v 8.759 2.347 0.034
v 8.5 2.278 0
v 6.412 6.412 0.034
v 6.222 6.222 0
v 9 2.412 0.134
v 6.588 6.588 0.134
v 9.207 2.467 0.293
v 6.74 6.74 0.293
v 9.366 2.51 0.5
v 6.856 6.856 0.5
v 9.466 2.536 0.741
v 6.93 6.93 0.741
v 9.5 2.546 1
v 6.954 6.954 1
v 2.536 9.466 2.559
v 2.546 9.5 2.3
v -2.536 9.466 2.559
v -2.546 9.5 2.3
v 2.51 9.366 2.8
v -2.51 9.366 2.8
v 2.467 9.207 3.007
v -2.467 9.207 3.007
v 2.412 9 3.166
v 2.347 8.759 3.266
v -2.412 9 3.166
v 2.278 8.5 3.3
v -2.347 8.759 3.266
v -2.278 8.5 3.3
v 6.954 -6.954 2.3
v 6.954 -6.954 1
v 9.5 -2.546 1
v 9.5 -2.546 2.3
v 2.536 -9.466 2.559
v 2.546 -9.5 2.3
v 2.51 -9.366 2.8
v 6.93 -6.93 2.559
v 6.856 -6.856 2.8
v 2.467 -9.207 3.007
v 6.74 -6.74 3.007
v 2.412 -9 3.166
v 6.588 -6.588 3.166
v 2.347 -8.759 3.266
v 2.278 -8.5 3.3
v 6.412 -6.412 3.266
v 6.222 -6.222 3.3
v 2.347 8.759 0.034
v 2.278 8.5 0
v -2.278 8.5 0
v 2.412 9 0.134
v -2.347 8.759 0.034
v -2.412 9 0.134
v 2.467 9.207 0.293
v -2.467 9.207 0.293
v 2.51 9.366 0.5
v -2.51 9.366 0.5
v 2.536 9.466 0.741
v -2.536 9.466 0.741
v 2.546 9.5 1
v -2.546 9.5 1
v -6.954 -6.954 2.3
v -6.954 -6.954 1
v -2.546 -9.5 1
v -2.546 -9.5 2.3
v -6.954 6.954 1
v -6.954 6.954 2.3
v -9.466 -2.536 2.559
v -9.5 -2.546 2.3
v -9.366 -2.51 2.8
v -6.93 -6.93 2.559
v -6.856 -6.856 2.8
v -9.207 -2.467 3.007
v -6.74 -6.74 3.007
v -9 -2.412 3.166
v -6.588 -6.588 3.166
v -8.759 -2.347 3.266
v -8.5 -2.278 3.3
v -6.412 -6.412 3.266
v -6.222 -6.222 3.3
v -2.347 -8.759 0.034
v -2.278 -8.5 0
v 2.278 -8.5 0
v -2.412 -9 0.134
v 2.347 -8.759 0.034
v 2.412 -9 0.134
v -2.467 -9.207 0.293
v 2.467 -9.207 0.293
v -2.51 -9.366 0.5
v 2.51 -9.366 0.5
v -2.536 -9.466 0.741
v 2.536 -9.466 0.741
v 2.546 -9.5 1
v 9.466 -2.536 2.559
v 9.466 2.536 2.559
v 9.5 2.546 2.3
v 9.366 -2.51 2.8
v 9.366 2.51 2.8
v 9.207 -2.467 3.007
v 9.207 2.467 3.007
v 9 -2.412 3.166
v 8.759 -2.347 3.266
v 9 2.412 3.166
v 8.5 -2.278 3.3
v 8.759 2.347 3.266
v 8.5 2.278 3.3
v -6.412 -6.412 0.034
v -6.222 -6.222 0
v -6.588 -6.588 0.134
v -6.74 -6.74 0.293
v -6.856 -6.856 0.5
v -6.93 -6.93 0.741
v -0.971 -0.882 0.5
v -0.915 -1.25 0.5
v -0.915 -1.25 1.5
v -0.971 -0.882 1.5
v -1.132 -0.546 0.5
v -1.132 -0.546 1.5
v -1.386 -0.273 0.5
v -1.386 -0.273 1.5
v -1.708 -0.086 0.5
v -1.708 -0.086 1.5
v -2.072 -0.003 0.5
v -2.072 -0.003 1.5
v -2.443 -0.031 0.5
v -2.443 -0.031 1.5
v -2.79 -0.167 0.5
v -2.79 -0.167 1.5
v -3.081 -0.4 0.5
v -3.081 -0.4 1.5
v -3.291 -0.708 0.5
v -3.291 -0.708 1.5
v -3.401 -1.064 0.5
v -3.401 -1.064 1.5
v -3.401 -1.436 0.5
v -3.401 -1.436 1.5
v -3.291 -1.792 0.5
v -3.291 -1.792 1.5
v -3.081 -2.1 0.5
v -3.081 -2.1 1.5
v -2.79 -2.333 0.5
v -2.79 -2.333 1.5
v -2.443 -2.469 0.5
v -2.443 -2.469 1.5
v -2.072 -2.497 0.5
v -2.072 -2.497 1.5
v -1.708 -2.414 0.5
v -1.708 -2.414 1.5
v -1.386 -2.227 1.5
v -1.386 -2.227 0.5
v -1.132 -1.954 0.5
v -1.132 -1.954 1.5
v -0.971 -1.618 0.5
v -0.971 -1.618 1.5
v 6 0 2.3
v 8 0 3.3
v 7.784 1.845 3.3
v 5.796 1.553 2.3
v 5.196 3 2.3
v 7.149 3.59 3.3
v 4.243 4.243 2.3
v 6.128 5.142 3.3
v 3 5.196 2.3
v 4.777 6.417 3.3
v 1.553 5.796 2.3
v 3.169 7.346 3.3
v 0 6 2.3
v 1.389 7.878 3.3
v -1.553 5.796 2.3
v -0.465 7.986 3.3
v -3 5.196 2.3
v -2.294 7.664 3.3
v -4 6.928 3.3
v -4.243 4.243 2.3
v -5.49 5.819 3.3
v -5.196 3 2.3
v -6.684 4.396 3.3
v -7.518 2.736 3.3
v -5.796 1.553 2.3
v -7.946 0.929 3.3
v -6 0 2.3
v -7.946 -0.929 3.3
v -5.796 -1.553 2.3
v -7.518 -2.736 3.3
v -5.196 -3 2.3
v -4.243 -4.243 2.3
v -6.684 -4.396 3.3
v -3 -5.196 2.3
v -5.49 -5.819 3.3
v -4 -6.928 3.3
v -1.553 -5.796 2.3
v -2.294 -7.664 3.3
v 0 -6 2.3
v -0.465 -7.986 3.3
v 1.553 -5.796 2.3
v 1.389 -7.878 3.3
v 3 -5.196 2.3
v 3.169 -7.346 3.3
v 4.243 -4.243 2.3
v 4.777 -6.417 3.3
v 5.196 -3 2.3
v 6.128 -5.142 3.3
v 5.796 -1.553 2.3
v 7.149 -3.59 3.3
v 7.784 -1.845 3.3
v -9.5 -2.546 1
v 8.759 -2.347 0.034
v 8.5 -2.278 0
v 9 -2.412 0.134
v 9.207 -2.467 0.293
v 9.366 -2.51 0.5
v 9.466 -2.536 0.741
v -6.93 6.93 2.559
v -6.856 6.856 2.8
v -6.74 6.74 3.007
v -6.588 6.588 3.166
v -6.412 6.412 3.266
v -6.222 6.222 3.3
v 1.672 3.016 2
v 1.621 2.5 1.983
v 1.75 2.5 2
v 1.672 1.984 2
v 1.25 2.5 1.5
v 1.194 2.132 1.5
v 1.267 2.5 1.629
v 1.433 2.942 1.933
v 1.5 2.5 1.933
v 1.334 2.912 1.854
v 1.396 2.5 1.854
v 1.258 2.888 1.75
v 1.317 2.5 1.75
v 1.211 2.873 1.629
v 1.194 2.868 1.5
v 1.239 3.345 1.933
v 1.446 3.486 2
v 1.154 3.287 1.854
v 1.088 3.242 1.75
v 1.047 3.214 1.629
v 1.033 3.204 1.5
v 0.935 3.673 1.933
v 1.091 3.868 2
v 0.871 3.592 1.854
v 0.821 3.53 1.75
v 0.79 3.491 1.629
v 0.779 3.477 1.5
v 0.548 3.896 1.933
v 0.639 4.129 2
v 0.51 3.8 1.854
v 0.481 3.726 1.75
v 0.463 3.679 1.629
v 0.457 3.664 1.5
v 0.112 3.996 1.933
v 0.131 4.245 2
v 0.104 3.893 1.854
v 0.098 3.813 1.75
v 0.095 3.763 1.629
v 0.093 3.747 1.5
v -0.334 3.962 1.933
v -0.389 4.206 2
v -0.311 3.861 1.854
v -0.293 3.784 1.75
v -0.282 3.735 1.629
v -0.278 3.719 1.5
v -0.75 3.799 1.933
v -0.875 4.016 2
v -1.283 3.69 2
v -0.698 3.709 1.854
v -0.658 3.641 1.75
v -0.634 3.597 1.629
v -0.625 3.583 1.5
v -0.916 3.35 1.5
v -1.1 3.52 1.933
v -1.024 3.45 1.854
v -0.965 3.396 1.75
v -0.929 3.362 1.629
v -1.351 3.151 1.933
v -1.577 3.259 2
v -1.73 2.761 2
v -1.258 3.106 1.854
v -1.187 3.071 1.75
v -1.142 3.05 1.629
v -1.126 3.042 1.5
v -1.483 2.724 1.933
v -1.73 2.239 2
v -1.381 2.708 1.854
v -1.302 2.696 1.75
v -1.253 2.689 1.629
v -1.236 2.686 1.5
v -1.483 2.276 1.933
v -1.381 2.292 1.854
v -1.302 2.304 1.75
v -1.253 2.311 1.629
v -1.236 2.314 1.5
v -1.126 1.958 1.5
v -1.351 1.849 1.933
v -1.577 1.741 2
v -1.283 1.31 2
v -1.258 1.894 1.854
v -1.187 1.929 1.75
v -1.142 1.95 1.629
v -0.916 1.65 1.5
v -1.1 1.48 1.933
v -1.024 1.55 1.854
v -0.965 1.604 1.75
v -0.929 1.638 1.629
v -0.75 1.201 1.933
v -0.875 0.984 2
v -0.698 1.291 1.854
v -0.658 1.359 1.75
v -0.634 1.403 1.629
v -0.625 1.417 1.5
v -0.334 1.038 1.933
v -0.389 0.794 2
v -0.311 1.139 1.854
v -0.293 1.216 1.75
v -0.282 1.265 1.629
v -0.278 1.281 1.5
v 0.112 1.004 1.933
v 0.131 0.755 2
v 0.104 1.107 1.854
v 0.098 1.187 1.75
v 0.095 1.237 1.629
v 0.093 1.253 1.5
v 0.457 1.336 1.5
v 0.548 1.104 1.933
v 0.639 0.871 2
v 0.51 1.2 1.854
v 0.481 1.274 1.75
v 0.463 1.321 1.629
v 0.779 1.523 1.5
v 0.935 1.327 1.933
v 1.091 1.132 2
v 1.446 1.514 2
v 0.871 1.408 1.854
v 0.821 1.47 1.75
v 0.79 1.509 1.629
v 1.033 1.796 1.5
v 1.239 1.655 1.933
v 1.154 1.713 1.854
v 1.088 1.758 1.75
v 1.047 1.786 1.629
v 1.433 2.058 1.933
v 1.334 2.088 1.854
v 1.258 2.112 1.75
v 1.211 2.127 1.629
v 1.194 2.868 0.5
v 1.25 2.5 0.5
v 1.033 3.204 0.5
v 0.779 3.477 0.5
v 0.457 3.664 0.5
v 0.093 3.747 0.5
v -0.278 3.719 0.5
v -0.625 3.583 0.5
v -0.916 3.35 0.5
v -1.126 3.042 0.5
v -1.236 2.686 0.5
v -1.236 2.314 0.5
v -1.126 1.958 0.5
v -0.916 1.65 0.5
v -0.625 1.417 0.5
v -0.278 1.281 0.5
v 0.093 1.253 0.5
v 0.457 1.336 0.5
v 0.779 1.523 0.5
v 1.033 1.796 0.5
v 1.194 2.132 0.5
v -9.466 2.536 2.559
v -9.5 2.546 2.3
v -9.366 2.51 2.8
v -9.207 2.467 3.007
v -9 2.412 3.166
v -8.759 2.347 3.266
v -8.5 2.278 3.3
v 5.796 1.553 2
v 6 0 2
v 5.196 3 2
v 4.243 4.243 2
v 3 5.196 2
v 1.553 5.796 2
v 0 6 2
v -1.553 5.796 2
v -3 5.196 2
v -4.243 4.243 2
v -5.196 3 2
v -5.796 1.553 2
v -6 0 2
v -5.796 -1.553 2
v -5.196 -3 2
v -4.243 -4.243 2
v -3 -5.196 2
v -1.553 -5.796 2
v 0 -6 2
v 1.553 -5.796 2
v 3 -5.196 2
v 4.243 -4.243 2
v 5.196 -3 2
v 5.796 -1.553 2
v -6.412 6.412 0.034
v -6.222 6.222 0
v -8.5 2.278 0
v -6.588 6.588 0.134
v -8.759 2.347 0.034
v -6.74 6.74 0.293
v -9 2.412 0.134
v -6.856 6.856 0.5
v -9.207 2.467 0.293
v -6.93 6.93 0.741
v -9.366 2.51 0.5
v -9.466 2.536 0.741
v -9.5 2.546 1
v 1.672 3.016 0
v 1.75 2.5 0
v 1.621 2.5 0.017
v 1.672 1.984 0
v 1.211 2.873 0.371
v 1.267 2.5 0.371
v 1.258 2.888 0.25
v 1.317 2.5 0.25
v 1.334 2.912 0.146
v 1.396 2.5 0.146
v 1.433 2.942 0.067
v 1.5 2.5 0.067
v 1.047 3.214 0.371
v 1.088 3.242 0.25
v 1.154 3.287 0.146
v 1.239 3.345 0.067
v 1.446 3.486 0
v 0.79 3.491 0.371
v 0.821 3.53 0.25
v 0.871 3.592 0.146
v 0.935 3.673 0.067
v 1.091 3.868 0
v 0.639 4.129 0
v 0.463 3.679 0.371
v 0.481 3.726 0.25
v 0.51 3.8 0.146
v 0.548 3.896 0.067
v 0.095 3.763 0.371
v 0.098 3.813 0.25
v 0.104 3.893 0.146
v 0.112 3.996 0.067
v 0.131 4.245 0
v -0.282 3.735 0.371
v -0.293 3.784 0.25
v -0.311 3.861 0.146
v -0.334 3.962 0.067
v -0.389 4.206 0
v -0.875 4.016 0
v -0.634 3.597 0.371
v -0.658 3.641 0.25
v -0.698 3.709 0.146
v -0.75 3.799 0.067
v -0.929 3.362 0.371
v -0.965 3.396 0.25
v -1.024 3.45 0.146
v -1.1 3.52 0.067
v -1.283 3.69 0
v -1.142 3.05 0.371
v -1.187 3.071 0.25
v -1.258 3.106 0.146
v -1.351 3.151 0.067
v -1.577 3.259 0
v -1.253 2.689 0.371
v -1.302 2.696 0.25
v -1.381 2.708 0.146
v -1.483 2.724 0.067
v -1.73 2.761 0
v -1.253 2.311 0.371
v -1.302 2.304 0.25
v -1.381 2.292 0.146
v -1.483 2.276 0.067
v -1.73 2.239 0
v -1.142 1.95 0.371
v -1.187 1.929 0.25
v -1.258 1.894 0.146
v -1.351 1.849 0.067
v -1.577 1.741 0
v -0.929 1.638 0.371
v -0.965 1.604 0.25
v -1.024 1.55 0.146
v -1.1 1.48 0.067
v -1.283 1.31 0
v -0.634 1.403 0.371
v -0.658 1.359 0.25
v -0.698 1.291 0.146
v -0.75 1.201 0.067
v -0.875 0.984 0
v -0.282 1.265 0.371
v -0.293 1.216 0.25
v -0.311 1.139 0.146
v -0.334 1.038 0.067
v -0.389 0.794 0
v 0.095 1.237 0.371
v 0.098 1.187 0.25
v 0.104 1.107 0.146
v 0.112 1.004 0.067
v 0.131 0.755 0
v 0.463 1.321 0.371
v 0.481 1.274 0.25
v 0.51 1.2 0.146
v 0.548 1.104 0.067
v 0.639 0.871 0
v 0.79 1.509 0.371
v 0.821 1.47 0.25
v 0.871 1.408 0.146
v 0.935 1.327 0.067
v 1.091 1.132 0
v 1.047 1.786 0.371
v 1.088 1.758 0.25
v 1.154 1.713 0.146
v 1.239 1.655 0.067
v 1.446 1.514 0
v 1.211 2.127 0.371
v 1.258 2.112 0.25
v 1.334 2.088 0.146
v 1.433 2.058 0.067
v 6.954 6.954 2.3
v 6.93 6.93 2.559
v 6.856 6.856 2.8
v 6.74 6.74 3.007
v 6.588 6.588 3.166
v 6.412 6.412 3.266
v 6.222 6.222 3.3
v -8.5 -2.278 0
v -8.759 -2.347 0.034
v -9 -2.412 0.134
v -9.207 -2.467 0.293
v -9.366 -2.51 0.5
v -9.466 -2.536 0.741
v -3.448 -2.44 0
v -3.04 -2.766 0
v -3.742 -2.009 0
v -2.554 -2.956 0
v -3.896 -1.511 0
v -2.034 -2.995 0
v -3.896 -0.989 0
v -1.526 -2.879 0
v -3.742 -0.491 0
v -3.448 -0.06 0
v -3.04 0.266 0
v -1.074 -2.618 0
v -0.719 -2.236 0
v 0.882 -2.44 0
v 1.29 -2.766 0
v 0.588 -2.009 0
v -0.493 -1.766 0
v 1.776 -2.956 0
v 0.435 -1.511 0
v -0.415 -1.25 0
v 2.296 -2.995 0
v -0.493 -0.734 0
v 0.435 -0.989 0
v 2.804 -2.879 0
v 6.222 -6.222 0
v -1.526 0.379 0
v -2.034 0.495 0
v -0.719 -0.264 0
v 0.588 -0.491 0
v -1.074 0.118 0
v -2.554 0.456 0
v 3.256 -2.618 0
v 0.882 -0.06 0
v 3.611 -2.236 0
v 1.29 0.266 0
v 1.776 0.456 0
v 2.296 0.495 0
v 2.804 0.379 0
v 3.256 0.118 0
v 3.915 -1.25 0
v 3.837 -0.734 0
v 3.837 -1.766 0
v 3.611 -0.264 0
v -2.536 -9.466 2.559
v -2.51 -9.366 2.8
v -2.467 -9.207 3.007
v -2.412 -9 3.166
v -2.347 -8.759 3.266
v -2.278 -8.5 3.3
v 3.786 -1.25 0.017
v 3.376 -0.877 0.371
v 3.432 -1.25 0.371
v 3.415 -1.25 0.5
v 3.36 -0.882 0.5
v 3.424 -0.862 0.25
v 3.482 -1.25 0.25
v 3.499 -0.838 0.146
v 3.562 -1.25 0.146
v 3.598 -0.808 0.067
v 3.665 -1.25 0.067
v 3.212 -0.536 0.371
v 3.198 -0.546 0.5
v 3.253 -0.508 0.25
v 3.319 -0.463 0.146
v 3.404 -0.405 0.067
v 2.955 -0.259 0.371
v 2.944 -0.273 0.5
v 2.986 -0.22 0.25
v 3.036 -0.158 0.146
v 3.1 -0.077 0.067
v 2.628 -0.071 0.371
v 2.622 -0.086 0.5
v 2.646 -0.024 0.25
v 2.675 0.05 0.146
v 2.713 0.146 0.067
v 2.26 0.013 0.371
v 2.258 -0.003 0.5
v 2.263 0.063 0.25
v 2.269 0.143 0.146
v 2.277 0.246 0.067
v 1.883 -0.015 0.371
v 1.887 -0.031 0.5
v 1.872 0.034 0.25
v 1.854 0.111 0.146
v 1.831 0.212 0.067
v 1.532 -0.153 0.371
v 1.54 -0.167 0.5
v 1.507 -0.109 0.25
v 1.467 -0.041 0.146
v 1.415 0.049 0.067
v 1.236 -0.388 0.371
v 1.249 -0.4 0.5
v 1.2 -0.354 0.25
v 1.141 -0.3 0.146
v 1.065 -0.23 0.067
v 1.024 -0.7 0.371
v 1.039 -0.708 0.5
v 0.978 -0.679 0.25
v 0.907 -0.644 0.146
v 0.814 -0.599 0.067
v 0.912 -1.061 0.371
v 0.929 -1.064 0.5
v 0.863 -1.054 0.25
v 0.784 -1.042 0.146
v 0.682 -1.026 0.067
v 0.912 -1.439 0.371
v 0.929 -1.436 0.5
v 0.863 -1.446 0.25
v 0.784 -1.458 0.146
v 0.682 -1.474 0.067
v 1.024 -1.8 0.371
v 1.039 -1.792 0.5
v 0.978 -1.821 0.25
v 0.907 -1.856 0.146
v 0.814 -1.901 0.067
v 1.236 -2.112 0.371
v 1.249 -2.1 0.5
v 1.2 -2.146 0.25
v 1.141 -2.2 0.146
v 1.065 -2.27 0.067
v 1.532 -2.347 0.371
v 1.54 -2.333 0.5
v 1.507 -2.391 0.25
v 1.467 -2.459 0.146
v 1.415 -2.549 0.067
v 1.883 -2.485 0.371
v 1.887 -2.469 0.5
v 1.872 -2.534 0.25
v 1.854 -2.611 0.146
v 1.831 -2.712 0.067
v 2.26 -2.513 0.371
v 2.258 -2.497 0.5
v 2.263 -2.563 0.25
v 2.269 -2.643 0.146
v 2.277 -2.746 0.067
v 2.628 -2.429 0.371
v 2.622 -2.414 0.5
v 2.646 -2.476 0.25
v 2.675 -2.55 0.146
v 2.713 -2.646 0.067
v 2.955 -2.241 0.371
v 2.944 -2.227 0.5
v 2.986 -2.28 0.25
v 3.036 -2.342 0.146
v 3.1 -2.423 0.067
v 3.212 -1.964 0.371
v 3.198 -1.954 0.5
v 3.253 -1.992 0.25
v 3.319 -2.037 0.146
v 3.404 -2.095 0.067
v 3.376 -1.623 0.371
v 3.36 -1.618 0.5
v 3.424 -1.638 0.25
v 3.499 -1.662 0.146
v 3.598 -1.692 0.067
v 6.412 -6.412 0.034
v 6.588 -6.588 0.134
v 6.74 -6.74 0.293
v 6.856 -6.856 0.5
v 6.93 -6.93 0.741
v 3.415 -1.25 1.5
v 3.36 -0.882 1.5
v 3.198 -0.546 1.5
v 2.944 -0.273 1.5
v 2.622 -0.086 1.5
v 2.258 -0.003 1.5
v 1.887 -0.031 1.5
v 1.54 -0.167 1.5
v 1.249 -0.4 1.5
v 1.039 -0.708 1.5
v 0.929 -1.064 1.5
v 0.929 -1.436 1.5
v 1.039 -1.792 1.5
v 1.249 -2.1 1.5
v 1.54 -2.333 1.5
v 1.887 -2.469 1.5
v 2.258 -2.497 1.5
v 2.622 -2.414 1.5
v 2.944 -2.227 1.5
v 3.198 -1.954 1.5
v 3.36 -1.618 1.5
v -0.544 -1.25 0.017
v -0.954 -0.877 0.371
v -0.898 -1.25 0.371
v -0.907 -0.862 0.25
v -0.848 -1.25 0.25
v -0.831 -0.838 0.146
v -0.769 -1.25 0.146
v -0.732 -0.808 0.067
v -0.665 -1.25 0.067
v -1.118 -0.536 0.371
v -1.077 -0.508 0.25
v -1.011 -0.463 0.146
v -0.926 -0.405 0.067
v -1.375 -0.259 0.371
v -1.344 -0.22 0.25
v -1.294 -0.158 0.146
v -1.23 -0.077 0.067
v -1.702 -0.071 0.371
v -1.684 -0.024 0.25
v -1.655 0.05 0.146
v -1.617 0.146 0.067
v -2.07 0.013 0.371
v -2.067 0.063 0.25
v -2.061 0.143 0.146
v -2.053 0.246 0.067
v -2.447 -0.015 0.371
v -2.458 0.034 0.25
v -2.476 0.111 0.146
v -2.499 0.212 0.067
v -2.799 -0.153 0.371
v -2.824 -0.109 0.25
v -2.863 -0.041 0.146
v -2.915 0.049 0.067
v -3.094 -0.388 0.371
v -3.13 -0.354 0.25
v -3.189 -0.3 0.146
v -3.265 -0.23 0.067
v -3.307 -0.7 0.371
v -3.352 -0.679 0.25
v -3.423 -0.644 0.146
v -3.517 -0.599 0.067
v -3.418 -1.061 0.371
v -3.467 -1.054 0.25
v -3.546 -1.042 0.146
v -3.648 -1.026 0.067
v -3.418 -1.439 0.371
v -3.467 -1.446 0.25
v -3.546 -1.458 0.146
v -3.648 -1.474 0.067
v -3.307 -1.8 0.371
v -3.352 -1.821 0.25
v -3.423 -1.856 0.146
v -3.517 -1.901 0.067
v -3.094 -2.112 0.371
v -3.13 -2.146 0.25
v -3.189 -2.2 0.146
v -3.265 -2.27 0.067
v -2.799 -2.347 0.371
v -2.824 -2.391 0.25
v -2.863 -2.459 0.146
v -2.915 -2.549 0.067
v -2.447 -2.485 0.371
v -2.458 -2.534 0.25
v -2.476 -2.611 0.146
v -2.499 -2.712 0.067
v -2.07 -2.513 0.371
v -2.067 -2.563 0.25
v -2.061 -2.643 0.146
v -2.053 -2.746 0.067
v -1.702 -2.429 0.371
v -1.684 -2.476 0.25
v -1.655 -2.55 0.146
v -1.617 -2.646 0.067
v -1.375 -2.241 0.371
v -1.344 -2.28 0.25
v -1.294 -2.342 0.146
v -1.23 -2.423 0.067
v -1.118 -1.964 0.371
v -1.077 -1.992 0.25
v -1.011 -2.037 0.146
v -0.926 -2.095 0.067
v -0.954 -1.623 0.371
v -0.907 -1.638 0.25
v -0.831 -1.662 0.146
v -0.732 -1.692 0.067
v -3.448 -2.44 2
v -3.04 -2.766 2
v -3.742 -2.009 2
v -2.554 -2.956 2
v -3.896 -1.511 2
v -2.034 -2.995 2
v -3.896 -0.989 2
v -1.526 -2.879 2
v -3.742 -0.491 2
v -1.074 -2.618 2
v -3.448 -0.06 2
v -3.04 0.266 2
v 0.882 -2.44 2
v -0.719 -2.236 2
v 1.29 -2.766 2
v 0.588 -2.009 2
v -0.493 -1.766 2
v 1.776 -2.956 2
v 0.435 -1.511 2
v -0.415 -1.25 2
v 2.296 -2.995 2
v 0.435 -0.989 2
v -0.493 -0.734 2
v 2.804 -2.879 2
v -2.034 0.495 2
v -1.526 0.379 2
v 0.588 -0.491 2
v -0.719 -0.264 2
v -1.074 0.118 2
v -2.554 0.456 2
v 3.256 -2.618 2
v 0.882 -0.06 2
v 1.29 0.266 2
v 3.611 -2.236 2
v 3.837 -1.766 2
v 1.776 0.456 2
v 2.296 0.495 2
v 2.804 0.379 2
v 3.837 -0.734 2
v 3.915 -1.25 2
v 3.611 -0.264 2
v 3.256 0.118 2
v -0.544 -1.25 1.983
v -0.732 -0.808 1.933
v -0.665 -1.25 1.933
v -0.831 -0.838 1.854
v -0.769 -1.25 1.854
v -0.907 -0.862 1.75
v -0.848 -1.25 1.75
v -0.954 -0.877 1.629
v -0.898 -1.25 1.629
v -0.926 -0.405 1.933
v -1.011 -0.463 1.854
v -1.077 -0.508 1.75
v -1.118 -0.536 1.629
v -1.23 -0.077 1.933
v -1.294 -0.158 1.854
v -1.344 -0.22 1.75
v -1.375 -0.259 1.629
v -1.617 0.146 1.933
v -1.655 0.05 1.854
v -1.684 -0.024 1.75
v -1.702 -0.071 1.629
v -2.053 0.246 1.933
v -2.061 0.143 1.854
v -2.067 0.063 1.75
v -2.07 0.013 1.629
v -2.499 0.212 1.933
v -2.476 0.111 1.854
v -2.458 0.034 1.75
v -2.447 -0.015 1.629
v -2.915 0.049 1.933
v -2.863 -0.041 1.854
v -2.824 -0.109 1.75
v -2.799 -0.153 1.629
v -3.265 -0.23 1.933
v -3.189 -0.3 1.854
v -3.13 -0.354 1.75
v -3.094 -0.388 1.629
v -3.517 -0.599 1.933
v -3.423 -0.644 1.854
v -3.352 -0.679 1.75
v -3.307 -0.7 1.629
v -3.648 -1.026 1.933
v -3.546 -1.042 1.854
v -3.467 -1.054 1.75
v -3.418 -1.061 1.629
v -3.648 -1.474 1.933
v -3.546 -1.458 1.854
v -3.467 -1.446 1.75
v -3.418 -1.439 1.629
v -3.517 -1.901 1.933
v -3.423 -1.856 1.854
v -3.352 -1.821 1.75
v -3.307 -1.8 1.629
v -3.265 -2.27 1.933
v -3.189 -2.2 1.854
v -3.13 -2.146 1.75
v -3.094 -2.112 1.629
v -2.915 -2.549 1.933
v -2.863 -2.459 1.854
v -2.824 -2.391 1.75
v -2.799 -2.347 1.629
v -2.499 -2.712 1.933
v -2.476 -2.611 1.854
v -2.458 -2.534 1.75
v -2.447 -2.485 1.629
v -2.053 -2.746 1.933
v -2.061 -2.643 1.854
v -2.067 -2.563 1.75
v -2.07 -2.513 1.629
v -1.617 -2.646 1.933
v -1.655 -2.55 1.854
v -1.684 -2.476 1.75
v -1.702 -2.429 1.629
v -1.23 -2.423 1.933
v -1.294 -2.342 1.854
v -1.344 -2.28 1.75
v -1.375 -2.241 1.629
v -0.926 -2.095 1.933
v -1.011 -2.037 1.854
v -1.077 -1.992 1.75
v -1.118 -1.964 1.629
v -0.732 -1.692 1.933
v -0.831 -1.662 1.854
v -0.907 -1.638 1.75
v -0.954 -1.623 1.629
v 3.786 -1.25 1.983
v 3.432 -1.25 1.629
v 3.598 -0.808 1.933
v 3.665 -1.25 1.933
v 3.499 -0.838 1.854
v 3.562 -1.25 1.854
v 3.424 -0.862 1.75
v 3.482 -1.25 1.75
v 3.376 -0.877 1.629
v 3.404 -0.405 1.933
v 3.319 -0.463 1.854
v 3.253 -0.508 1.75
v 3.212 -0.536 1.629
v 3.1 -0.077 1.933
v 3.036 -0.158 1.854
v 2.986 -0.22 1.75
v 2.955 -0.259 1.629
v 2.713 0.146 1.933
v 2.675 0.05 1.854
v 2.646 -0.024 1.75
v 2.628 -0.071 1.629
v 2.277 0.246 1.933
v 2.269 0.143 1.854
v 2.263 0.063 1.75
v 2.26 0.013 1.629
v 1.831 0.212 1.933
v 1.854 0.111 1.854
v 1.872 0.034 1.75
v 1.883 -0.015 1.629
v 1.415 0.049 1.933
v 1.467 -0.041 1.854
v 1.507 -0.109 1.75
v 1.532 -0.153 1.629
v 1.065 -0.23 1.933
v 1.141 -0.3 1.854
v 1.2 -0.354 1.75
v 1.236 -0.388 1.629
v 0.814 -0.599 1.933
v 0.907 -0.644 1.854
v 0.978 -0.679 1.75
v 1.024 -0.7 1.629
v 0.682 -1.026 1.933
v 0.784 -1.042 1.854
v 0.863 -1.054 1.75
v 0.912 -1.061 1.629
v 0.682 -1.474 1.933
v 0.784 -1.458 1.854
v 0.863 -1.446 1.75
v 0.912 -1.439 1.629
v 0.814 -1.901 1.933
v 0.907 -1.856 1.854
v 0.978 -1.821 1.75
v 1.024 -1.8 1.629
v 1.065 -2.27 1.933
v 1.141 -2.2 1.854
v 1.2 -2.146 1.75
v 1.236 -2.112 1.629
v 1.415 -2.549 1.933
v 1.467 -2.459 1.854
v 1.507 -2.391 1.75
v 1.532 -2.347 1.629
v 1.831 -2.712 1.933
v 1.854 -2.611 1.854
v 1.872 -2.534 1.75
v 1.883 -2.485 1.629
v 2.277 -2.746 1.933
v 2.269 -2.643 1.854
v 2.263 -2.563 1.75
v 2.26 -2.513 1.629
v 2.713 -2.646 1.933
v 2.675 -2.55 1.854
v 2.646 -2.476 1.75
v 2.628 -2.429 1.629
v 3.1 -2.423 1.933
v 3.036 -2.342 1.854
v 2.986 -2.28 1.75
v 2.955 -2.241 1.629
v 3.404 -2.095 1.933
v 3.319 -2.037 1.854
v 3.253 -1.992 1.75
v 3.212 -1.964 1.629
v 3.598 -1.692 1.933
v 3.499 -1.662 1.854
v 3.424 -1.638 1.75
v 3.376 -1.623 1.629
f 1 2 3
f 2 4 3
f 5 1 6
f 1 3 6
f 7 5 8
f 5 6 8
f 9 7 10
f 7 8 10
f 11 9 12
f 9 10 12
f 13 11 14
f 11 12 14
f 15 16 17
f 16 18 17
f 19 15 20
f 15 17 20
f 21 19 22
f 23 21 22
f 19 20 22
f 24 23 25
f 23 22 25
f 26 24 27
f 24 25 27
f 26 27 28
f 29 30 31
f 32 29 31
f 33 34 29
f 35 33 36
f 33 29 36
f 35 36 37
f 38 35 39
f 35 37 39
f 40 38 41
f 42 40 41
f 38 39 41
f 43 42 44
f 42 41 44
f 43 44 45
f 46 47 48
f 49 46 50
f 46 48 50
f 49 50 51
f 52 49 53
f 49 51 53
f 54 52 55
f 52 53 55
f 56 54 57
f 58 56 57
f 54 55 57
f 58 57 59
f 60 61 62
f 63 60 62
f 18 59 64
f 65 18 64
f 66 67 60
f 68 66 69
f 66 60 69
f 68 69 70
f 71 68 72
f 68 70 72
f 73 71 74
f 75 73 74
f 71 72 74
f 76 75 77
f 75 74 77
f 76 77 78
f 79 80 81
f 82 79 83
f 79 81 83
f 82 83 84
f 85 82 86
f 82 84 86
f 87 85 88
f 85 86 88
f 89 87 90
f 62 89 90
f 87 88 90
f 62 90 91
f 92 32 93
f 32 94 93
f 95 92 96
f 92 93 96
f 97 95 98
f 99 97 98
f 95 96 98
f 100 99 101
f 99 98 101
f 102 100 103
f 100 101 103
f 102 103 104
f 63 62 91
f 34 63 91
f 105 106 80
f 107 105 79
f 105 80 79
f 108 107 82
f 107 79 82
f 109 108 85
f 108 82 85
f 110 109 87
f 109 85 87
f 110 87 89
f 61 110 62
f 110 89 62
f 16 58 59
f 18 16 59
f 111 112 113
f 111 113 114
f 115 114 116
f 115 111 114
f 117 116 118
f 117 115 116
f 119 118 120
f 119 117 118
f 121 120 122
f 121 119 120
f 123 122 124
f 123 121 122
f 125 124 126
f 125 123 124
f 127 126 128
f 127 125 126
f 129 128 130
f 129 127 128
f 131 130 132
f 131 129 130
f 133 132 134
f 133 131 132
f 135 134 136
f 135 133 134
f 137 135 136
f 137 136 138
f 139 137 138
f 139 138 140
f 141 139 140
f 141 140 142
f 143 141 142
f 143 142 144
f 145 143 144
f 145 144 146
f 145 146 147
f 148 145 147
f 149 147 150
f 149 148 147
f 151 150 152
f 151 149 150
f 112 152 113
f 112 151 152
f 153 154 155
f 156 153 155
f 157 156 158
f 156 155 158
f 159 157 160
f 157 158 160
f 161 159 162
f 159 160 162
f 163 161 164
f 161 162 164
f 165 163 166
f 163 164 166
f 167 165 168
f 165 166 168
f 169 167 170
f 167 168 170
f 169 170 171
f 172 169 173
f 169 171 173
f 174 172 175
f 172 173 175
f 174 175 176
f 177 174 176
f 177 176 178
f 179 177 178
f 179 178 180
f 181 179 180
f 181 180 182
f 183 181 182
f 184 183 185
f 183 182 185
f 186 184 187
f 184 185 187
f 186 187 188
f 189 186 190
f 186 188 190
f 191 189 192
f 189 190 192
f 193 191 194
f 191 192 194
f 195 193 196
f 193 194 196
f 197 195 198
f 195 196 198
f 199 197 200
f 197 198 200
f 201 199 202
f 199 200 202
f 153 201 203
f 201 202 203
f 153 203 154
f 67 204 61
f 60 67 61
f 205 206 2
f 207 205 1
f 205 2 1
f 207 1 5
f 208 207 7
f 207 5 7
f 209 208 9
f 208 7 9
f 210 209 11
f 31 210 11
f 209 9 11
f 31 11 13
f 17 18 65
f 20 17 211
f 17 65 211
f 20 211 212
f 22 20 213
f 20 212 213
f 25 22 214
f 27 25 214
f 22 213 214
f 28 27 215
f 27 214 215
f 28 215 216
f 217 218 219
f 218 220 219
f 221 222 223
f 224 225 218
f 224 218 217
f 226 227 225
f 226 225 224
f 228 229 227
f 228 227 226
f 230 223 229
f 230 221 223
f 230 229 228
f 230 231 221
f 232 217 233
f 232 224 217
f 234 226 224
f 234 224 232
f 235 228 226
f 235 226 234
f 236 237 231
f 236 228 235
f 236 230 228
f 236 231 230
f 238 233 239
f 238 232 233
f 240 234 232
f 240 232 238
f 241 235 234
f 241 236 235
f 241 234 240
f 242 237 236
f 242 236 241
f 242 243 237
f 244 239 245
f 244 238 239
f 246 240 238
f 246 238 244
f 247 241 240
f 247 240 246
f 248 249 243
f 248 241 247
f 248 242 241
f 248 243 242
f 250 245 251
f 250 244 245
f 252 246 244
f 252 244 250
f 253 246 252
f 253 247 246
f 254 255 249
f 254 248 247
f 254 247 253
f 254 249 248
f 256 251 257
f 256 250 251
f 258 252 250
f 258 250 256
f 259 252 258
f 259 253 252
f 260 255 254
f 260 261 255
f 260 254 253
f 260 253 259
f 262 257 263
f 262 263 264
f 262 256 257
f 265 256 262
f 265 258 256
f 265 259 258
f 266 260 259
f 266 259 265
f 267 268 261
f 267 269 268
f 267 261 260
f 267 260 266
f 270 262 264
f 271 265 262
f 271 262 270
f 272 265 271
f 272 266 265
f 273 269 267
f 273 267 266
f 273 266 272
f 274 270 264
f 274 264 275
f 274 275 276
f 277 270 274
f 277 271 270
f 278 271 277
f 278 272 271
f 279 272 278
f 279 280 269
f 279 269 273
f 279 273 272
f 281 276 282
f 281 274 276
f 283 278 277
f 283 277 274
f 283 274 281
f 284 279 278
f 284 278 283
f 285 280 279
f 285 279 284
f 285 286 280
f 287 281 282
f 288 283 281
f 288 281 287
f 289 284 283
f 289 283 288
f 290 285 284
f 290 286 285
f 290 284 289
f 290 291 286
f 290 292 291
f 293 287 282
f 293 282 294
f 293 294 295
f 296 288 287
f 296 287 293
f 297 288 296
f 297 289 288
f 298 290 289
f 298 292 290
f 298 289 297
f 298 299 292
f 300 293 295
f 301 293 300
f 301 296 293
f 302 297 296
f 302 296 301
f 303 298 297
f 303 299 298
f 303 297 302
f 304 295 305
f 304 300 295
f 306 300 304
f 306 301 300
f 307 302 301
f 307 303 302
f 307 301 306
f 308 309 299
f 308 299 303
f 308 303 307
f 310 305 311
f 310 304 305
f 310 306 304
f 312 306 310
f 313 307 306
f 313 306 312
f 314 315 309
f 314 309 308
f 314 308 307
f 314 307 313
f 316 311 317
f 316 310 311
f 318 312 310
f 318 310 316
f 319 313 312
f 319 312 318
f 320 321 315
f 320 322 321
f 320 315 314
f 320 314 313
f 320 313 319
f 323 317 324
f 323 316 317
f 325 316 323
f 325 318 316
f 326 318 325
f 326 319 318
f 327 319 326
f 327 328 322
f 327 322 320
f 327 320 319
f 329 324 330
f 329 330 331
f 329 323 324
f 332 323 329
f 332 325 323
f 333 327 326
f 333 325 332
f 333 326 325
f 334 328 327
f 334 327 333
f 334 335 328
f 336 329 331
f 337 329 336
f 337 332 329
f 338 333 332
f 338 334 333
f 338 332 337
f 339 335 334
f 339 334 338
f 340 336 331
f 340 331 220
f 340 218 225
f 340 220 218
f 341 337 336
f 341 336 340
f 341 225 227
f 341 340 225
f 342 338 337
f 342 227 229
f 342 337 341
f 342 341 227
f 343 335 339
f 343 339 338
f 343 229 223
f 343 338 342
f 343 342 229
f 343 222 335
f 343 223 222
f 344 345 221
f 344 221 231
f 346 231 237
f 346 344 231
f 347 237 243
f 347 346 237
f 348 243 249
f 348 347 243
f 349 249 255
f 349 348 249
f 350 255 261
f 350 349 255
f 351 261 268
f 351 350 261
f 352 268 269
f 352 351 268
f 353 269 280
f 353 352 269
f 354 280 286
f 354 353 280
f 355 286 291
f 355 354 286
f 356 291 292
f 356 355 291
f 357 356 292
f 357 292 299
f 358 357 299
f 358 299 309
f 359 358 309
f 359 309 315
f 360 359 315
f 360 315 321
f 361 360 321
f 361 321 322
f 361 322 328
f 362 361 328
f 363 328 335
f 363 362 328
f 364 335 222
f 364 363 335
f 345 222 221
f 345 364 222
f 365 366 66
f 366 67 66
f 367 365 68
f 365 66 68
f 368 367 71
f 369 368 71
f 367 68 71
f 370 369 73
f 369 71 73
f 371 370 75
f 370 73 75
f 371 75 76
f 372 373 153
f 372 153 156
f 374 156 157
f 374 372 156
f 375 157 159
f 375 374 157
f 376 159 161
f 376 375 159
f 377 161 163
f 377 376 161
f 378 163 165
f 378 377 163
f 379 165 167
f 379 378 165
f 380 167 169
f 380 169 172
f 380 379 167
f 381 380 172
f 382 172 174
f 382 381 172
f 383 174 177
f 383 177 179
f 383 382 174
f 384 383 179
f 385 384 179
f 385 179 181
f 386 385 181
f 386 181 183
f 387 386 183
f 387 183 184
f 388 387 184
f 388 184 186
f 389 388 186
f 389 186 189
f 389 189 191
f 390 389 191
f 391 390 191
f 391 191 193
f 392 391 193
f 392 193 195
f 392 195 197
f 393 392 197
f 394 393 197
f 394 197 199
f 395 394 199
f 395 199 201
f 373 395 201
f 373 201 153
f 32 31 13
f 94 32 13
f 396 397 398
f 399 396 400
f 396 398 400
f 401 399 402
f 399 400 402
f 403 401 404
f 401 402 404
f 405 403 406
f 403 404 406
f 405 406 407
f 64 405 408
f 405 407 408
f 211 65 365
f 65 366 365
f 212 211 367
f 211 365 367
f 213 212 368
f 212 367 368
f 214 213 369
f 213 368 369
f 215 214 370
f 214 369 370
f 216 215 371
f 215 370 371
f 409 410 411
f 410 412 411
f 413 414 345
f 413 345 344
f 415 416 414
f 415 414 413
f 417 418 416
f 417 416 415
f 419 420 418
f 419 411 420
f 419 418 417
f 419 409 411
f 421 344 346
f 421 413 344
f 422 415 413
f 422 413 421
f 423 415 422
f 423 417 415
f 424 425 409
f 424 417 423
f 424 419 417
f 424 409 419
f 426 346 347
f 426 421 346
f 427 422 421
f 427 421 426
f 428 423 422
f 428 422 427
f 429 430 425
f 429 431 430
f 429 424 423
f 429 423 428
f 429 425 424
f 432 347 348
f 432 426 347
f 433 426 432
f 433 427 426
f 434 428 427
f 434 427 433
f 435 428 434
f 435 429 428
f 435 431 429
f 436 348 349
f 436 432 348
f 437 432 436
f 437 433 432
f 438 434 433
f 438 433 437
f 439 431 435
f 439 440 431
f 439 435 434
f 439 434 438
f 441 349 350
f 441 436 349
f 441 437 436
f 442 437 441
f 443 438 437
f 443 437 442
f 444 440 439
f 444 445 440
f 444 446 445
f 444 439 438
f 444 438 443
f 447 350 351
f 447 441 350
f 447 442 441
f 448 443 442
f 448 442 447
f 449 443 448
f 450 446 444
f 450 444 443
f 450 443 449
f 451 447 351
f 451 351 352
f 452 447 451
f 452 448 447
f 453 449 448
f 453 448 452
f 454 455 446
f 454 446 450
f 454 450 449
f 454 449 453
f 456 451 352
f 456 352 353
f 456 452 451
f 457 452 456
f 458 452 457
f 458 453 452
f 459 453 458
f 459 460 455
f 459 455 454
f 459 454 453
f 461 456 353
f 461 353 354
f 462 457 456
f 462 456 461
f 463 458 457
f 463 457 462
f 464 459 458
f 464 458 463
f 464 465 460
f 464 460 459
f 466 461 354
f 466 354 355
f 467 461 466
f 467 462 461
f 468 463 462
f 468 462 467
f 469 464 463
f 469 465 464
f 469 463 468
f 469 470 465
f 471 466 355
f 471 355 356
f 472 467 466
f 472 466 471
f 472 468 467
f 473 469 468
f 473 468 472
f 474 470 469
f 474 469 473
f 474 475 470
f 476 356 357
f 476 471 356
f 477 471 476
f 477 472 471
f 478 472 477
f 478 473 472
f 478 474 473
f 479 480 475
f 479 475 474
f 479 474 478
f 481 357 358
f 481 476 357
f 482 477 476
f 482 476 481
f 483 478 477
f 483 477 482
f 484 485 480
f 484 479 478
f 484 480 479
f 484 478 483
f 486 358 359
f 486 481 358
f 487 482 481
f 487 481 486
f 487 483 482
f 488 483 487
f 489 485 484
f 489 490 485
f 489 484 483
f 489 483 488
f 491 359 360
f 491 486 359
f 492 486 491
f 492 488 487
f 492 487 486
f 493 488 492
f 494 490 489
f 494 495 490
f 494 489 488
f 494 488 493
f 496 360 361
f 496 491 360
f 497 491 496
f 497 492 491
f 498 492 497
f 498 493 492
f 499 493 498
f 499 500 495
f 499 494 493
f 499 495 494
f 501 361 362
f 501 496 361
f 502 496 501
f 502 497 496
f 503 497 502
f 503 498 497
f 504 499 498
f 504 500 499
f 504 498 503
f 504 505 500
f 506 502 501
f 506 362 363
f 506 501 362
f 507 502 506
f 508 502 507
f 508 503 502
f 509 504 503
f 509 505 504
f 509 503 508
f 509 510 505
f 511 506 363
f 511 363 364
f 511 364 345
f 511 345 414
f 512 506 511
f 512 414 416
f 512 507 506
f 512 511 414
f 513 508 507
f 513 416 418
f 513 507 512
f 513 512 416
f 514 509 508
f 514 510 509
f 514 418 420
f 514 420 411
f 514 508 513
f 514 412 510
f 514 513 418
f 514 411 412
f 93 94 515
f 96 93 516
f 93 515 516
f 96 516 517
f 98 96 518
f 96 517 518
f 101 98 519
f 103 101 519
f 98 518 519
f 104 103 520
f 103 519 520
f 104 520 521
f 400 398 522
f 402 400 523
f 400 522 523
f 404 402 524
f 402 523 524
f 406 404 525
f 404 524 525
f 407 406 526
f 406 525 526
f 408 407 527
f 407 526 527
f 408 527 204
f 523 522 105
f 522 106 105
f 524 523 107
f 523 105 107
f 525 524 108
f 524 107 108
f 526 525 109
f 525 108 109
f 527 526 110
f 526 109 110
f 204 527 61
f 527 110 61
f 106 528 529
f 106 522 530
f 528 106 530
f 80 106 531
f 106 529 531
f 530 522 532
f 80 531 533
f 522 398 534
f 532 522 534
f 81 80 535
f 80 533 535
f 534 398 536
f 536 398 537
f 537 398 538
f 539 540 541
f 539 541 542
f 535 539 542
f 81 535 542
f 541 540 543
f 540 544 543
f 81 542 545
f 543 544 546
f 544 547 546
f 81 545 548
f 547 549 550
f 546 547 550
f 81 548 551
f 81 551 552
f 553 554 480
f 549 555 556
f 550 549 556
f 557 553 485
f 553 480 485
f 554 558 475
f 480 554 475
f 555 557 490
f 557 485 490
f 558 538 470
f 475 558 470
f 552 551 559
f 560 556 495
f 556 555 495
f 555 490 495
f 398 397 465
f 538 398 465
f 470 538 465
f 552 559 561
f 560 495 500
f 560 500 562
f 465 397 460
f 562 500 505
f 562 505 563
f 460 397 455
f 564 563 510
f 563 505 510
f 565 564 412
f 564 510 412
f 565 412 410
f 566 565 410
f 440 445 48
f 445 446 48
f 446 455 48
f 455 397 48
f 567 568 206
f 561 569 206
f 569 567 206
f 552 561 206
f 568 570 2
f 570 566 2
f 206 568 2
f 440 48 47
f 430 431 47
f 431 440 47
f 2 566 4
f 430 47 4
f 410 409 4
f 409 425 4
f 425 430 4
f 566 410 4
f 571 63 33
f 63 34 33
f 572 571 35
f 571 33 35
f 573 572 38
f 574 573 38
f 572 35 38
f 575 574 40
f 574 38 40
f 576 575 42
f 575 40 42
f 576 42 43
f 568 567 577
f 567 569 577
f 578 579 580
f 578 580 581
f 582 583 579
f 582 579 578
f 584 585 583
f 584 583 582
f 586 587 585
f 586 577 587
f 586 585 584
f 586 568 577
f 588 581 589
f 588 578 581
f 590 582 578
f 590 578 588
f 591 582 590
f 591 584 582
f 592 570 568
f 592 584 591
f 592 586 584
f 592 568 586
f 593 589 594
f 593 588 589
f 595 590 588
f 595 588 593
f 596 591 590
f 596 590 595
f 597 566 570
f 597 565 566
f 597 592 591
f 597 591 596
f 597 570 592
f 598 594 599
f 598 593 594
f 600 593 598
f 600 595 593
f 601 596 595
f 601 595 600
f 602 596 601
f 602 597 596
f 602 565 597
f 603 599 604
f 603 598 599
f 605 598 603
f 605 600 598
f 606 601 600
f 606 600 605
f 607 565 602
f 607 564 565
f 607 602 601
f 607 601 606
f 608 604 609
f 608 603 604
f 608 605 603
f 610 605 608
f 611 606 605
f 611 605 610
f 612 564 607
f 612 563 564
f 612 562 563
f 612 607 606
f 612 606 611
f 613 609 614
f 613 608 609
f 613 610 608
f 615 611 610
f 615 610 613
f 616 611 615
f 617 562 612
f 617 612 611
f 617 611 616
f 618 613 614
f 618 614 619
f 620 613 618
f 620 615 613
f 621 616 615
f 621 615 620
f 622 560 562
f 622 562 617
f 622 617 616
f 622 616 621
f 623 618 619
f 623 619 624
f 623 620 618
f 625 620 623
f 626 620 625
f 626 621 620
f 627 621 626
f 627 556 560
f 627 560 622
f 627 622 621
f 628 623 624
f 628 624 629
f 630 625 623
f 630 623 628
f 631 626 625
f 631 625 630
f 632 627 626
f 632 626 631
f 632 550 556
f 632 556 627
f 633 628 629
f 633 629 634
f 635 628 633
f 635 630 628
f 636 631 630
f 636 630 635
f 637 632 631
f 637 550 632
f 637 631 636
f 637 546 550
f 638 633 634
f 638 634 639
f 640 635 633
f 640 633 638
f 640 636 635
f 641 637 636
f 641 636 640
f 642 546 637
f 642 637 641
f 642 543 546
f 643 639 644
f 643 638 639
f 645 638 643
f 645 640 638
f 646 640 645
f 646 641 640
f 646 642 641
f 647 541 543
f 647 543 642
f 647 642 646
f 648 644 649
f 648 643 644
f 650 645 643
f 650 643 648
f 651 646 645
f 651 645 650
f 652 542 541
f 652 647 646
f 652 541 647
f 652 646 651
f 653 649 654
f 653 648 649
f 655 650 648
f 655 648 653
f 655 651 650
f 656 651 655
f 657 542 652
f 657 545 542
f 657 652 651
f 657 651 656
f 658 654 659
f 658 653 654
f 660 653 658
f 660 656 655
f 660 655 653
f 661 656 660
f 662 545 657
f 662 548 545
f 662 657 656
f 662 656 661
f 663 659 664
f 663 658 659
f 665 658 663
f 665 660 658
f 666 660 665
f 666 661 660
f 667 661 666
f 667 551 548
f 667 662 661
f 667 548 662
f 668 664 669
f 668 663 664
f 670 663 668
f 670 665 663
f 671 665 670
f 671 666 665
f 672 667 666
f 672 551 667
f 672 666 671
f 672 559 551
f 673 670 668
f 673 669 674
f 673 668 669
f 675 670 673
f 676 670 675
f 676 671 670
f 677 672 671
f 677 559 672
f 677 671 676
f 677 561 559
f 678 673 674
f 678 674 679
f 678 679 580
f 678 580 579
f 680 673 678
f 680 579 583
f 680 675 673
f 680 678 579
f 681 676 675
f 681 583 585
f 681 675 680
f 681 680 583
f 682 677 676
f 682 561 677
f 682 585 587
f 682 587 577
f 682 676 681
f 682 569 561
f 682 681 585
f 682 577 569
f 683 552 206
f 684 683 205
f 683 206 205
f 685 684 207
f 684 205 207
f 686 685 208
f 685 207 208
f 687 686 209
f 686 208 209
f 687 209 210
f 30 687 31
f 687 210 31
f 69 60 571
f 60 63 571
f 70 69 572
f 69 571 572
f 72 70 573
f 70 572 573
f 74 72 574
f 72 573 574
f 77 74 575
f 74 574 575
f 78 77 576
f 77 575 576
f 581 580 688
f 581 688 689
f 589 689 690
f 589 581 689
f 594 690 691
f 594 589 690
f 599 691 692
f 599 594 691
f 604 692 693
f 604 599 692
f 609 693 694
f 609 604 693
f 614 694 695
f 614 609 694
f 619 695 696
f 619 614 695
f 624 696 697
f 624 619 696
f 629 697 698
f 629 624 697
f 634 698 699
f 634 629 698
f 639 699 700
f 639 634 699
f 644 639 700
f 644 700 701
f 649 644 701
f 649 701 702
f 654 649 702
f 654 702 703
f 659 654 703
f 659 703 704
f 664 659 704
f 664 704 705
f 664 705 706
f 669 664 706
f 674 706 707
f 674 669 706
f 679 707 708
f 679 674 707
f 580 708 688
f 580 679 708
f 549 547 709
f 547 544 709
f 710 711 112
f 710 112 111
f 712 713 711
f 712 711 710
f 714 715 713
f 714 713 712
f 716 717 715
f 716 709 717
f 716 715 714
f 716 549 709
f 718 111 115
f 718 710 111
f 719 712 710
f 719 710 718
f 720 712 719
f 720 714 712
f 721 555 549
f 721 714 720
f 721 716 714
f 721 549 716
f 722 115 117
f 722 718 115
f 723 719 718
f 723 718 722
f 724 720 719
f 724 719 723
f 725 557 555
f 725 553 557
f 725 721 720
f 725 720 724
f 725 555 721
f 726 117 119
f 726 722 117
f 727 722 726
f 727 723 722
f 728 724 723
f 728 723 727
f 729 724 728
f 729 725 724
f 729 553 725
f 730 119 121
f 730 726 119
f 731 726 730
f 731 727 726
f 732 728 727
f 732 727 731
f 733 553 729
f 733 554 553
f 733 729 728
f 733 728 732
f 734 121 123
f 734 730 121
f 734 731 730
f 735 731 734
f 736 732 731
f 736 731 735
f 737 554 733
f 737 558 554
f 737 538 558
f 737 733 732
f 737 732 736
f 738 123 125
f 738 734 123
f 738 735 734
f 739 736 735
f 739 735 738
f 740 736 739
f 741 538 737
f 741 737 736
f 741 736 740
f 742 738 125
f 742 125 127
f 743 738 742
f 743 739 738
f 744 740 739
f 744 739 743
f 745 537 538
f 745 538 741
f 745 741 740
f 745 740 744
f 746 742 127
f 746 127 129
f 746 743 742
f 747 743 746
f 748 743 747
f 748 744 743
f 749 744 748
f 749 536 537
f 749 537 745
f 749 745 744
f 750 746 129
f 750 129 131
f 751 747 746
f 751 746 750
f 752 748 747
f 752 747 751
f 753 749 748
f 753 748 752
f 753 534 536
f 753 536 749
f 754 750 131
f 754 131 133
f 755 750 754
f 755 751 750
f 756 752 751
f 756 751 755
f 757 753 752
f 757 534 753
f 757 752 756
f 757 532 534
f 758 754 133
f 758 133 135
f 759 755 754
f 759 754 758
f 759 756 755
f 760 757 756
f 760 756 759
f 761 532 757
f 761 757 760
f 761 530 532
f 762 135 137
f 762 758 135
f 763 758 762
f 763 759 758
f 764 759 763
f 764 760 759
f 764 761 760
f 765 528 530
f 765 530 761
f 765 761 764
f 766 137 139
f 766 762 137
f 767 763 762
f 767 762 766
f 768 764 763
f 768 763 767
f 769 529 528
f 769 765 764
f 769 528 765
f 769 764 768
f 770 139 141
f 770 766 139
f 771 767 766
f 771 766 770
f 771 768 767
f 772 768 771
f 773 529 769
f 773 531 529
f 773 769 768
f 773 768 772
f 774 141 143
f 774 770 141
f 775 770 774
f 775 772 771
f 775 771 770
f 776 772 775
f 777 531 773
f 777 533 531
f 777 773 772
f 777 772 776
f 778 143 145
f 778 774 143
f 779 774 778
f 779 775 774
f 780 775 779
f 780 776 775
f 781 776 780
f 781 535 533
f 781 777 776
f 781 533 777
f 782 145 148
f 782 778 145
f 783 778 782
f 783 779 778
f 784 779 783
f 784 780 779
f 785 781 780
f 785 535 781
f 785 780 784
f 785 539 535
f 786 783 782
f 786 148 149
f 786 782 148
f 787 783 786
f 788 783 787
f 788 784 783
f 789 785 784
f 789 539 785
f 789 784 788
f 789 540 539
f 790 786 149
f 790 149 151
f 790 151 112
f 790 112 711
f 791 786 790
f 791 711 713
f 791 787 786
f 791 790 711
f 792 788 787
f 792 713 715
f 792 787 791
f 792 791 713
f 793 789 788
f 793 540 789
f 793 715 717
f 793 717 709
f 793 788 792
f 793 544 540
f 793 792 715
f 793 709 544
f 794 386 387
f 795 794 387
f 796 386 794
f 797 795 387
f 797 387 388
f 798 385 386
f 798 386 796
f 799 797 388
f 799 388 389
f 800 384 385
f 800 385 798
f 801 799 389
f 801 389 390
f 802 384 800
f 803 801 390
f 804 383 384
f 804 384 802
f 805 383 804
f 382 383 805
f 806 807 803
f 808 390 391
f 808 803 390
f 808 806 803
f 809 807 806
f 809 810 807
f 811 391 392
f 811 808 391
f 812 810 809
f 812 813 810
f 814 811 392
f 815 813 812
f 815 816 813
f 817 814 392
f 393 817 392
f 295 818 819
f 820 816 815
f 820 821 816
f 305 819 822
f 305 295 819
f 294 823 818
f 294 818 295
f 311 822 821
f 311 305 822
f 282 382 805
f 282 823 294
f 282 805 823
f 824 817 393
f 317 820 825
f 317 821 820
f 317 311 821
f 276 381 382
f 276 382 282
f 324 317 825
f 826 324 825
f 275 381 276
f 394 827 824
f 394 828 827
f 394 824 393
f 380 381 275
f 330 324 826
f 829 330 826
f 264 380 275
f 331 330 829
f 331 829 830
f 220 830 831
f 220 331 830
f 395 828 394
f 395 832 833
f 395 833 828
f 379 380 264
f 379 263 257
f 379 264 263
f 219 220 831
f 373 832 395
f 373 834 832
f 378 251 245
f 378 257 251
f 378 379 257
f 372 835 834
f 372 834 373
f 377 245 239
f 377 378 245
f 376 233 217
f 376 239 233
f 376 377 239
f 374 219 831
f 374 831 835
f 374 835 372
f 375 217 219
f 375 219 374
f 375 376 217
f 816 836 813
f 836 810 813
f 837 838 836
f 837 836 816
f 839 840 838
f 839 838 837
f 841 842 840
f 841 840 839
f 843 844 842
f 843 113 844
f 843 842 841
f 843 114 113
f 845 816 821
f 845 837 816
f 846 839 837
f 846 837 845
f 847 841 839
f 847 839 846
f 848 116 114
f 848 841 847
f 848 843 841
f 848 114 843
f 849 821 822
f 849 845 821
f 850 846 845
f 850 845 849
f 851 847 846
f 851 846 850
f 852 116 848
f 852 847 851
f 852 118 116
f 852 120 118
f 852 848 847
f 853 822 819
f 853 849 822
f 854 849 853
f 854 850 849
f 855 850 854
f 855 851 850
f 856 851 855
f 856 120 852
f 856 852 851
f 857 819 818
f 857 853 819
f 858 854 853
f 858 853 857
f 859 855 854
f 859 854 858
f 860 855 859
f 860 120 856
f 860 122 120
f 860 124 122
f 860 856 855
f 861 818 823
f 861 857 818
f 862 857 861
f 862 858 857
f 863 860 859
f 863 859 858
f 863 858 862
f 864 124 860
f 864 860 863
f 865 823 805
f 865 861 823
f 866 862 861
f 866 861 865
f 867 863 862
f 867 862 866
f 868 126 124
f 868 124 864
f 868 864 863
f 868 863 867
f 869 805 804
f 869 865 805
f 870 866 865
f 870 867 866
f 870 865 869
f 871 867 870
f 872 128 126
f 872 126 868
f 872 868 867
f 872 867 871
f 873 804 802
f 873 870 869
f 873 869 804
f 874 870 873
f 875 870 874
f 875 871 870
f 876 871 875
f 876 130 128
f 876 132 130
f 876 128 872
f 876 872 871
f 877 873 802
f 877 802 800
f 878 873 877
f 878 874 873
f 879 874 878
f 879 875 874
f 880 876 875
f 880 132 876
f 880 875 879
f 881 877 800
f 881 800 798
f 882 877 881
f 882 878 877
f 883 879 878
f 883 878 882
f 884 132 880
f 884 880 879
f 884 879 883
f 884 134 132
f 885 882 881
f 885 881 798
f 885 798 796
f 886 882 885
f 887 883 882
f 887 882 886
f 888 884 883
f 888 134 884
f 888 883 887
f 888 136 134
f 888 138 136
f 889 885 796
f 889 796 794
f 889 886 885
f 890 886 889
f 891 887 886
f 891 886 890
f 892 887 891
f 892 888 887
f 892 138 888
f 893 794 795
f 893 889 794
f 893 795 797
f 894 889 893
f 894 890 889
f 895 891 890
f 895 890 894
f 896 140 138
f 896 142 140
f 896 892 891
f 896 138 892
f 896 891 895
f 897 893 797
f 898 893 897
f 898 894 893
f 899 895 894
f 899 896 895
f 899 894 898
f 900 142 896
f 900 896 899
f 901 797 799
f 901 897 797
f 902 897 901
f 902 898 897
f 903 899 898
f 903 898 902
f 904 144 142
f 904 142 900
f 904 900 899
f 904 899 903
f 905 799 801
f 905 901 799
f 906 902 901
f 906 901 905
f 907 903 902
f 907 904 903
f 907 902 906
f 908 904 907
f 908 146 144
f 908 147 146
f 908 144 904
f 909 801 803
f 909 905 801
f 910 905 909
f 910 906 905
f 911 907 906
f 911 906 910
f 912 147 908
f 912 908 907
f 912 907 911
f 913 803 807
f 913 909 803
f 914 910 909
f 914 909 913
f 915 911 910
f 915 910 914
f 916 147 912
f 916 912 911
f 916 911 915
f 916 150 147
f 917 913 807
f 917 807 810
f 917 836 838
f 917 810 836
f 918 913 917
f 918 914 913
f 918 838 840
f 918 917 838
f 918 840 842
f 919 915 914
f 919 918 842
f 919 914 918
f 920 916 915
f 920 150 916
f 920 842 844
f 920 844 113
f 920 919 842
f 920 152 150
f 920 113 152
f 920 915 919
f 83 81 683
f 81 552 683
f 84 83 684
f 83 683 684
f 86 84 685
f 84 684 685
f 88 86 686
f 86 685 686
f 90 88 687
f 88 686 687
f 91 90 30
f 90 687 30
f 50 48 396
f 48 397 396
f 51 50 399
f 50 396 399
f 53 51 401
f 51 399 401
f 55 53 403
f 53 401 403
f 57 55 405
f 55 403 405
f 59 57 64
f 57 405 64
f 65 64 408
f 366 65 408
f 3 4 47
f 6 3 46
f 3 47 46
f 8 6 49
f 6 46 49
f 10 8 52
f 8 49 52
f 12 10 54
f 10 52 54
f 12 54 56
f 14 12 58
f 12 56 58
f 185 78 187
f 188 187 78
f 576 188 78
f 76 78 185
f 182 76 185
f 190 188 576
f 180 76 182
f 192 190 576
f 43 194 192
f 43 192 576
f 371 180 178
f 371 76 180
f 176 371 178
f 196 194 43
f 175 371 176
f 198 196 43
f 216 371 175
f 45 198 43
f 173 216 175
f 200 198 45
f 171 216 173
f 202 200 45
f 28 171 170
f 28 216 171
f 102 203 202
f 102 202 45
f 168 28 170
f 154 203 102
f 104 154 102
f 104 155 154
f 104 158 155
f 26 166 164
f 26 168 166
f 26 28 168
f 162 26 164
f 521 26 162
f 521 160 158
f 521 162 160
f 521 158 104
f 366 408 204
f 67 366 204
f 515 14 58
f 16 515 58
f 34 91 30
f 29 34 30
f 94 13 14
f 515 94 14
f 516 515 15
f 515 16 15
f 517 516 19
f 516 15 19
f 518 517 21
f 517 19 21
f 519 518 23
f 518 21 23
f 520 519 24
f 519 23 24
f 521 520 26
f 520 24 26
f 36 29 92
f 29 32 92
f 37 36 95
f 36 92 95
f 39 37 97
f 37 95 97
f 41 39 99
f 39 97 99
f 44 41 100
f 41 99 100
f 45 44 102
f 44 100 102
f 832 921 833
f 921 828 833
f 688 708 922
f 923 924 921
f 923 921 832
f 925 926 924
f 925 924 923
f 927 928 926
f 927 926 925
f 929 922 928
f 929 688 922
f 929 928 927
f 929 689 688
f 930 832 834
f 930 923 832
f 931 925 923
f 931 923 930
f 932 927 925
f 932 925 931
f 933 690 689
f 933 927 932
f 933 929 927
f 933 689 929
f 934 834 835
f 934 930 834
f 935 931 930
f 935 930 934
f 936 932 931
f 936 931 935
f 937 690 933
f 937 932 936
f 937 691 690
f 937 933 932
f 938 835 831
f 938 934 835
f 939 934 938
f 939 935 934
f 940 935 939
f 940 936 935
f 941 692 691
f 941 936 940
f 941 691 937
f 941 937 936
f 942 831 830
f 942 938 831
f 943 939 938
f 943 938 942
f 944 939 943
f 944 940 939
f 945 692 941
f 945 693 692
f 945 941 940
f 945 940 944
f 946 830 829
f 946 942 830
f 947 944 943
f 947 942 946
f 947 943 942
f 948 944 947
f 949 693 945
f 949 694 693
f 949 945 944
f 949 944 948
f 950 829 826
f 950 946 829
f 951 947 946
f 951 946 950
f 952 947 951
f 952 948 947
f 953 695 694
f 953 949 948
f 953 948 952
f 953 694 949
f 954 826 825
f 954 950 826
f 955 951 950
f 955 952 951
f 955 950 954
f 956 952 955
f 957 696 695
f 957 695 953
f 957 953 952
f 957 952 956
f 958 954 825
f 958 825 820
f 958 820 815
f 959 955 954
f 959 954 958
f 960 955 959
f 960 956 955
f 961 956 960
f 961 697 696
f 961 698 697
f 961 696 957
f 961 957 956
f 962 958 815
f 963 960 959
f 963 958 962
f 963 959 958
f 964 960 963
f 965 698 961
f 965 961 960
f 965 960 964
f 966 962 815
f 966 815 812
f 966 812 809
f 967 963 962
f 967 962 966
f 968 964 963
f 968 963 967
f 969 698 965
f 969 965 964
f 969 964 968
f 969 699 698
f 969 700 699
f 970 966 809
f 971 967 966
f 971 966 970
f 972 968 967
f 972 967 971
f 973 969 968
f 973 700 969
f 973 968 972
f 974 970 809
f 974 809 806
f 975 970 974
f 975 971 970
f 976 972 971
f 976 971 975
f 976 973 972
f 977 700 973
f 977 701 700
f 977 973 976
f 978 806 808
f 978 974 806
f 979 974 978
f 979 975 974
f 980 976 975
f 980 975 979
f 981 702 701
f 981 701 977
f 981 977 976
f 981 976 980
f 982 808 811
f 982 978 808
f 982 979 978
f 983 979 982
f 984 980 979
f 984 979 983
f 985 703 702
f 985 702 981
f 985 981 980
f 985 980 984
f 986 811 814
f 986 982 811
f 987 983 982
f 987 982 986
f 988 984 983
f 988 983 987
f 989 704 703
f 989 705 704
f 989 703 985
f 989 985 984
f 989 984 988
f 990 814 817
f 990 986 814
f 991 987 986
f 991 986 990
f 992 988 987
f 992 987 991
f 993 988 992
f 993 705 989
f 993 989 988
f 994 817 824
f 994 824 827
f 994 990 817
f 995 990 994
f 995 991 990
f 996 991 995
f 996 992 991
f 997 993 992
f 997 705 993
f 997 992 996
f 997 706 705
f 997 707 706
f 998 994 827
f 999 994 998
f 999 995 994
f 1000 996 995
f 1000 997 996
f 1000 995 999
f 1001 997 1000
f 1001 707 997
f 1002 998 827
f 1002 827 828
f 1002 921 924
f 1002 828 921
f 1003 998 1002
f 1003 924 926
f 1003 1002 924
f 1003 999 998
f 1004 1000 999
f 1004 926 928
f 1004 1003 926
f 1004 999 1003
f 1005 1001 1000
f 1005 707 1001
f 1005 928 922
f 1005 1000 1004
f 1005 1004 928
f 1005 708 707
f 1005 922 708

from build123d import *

# Parameters (mm, degrees)
F0_R     = 6
F1_DEPTH = 3.3
F0_R_2   = 1.25
F2_DEPTH = 2
F3_R     = 1
F4_SIZE2 = 2
F4_SIZE  = 1
F5_R     = 0.5


with BuildPart() as f1:
    # F0 (on Top) → F1 (new body)
    with BuildSketch(Plane.XY):
        Polygon((2.5455173281, 9.5), (-2.5455173281, 9.5), (-6.9544826719, 6.9544826719), (-9.5, 2.5455173281), (-9.5, -2.5455173281), (-6.9544826719, -6.9544826719), (-2.5455173281, -9.5), (2.5455173281, -9.5), (6.9544826719, -6.9544826719), (9.5, -2.5455173281), (9.5, 2.5455173281), (6.9544826719, 6.9544826719), align=None)
        Circle(F0_R, mode=Mode.SUBTRACT)
    extrude(amount=F1_DEPTH)

    # F0 (on Top) → F2 (join)
    with BuildSketch(Plane.XY):
        Circle(F0_R)
        with Locations((-2.1650635095, -1.25)):
            Circle(F0_R_2, mode=Mode.SUBTRACT)
        with Locations((2.1650635095, -1.25)):
            Circle(F0_R_2, mode=Mode.SUBTRACT)
        with Locations((0, 2.5)):
            Circle(F0_R_2, mode=Mode.SUBTRACT)
    extrude(amount=F2_DEPTH)

    # F3
    f3_edges = [f1.edges().sort_by_distance(p)[0] for p in [
        (-8.227241, -4.75, 3.3),
        (-4.75, -8.227241, 3.3),
        (0, -9.5, 3.3),
        (4.75, -8.227241, 3.3),
        (8.227241, -4.75, 3.3),
        (9.5, 0, 3.3),
        (8.227241, 4.75, 3.3),
        (4.75, 8.227241, 3.3),
        (0, 9.5, 3.3),
        (-4.75, 8.227241, 3.3),
        (-8.227241, 4.75, 3.3),
        (-9.5, 0, 3.3),
        (-8.227241, -4.75, 0),
        (-4.75, -8.227241, 0),
        (0, -9.5, 0),
        (4.75, -8.227241, 0),
        (8.227241, -4.75, 0),
        (9.5, 0, 0),
        (8.227241, 4.75, 0),
        (4.75, 8.227241, 0),
        (0, 9.5, 0),
        (-4.75, 8.227241, 0),
        (-8.227241, 4.75, 0),
        (-9.5, 0, 0),
    ]]
    fillet(f3_edges, radius=F3_R)

    # F4
    f4_edges = [f1.edges().sort_by_distance(p)[0] for p in [
        (-6, 0, 3.3),
    ]]
    f4_side = f1.faces().sort_by_distance((-6, 0, 2.65))[0]
    chamfer(f4_edges, length=F4_SIZE, length2=F4_SIZE2, reference=f4_side)

    # F5
    f5_edges = [f1.edges().sort_by_distance(p)[0] for p in [
        (-1.25, 2.5, 2),
        (0.915064, -1.25, 2),
        (-3.415064, -1.25, 2),
        (0.915064, -1.25, 0),
        (-3.415064, -1.25, 0),
        (-1.25, 2.5, 0),
    ]]
    fillet(f5_edges, radius=F5_R)


solid = f1.part
